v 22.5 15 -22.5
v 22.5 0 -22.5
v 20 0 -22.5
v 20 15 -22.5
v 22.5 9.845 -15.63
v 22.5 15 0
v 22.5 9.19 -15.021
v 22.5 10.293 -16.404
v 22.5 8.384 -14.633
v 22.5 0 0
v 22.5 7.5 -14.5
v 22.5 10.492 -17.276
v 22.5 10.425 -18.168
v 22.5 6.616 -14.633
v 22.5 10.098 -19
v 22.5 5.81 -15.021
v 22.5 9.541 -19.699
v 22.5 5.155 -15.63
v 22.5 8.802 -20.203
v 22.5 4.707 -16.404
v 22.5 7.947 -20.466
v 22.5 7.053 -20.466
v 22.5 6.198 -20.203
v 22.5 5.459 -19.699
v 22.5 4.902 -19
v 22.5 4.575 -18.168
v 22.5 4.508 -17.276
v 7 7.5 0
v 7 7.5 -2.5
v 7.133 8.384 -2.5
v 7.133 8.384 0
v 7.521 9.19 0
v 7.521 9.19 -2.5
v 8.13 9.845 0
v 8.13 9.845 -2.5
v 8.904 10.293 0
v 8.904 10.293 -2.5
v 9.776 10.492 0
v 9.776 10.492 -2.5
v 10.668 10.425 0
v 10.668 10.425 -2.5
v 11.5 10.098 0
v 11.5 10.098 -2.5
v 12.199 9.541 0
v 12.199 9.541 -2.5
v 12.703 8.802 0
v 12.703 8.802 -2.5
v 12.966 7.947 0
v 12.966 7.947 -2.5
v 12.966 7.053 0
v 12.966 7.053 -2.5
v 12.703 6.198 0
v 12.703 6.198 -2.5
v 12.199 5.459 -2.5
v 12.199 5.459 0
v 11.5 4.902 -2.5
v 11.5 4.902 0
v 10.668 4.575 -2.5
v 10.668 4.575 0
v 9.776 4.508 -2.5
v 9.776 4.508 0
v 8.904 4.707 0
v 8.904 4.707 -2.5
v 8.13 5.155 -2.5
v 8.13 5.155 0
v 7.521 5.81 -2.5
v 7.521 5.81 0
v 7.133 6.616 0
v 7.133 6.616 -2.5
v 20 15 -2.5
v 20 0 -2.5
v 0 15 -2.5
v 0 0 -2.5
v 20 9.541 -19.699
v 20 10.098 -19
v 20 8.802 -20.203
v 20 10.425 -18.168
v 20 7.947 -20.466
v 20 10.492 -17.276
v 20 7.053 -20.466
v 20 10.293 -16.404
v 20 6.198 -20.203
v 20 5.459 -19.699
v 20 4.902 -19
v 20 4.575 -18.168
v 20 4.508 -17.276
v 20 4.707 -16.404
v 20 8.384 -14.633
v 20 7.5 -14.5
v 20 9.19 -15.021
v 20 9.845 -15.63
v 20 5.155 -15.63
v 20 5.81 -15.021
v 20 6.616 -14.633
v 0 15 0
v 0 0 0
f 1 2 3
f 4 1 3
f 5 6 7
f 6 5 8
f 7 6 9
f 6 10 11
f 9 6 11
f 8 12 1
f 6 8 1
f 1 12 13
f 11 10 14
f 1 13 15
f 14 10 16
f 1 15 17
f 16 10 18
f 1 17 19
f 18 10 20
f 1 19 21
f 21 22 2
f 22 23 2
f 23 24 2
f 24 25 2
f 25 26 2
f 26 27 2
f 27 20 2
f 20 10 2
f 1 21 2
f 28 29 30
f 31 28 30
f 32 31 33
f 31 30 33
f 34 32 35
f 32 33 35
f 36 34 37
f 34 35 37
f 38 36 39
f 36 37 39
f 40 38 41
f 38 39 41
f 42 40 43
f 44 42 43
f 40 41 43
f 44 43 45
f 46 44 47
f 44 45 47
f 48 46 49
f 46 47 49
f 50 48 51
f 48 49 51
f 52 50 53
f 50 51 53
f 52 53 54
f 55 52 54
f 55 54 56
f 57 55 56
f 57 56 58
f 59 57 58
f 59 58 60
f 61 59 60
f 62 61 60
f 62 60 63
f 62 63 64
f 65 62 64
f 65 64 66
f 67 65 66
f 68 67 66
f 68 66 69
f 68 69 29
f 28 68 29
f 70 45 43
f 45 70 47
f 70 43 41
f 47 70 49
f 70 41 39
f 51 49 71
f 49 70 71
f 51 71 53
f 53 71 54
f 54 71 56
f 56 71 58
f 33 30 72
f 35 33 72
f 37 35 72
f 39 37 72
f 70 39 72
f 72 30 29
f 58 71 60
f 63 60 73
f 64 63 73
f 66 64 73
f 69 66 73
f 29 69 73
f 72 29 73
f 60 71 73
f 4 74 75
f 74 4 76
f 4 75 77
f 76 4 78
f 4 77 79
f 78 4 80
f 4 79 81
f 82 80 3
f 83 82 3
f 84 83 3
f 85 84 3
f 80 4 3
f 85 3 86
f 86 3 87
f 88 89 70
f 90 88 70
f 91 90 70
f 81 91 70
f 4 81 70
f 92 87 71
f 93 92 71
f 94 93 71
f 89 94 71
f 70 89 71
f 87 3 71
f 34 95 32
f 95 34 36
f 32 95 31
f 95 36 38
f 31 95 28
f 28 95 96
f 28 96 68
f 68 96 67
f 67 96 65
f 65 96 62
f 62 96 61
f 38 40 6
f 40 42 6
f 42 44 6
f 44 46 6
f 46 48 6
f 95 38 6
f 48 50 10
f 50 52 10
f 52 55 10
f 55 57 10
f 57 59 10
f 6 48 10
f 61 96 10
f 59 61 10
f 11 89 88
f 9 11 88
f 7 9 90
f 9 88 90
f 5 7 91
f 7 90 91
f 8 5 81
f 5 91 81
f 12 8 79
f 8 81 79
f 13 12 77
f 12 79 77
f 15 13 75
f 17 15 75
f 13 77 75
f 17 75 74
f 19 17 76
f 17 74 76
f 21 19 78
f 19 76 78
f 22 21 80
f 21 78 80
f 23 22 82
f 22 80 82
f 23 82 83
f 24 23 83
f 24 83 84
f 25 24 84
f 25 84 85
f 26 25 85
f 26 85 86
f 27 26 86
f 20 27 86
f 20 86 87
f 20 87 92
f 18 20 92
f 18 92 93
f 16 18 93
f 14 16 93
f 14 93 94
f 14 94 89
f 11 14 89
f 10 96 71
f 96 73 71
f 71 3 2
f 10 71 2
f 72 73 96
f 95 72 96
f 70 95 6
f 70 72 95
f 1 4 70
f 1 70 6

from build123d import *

# Parameters (mm, degrees)
BOSS_EXTRUDE2_DEPTH = 15
SKETCH4_R           = 3
CUT_EXTRUDE2_DEPTH  = 34.634060118
SKETCH7_R           = 3
CUT_EXTRUDE4_DEPTH  = 34.634060118


with BuildPart() as part:
    # Sketch3 → Boss-Extrude2 (new body)
    with BuildSketch(Plane(origin=(0, 0, 0), x_dir=(1, 0, 0), z_dir=(0, 1, 0))):
        Polygon((0, 0), (22.5, 0), (22.5, 22.5), (20, 22.5), (20, 2.5), (0, 2.5), align=None)
    extrude(amount=BOSS_EXTRUDE2_DEPTH)

    # Sketch4 → Cut-Extrude2 (cut, through all)
    with BuildSketch(Plane(origin=(0, 0, -2.5), x_dir=(-1, 0, 0), z_dir=(0, 0, -1))):
        with Locations((-10, 7.5)):
            Circle(SKETCH4_R)
    extrude(amount=-CUT_EXTRUDE2_DEPTH, mode=Mode.SUBTRACT)

    # Sketch7 → Cut-Extrude4 (cut, through all)
    with BuildSketch(Plane.ZY.offset(-20)):
        with Locations((-17.5, 7.5)):
            Circle(SKETCH7_R)
    extrude(amount=-CUT_EXTRUDE4_DEPTH, mode=Mode.SUBTRACT)


solid = part.part
